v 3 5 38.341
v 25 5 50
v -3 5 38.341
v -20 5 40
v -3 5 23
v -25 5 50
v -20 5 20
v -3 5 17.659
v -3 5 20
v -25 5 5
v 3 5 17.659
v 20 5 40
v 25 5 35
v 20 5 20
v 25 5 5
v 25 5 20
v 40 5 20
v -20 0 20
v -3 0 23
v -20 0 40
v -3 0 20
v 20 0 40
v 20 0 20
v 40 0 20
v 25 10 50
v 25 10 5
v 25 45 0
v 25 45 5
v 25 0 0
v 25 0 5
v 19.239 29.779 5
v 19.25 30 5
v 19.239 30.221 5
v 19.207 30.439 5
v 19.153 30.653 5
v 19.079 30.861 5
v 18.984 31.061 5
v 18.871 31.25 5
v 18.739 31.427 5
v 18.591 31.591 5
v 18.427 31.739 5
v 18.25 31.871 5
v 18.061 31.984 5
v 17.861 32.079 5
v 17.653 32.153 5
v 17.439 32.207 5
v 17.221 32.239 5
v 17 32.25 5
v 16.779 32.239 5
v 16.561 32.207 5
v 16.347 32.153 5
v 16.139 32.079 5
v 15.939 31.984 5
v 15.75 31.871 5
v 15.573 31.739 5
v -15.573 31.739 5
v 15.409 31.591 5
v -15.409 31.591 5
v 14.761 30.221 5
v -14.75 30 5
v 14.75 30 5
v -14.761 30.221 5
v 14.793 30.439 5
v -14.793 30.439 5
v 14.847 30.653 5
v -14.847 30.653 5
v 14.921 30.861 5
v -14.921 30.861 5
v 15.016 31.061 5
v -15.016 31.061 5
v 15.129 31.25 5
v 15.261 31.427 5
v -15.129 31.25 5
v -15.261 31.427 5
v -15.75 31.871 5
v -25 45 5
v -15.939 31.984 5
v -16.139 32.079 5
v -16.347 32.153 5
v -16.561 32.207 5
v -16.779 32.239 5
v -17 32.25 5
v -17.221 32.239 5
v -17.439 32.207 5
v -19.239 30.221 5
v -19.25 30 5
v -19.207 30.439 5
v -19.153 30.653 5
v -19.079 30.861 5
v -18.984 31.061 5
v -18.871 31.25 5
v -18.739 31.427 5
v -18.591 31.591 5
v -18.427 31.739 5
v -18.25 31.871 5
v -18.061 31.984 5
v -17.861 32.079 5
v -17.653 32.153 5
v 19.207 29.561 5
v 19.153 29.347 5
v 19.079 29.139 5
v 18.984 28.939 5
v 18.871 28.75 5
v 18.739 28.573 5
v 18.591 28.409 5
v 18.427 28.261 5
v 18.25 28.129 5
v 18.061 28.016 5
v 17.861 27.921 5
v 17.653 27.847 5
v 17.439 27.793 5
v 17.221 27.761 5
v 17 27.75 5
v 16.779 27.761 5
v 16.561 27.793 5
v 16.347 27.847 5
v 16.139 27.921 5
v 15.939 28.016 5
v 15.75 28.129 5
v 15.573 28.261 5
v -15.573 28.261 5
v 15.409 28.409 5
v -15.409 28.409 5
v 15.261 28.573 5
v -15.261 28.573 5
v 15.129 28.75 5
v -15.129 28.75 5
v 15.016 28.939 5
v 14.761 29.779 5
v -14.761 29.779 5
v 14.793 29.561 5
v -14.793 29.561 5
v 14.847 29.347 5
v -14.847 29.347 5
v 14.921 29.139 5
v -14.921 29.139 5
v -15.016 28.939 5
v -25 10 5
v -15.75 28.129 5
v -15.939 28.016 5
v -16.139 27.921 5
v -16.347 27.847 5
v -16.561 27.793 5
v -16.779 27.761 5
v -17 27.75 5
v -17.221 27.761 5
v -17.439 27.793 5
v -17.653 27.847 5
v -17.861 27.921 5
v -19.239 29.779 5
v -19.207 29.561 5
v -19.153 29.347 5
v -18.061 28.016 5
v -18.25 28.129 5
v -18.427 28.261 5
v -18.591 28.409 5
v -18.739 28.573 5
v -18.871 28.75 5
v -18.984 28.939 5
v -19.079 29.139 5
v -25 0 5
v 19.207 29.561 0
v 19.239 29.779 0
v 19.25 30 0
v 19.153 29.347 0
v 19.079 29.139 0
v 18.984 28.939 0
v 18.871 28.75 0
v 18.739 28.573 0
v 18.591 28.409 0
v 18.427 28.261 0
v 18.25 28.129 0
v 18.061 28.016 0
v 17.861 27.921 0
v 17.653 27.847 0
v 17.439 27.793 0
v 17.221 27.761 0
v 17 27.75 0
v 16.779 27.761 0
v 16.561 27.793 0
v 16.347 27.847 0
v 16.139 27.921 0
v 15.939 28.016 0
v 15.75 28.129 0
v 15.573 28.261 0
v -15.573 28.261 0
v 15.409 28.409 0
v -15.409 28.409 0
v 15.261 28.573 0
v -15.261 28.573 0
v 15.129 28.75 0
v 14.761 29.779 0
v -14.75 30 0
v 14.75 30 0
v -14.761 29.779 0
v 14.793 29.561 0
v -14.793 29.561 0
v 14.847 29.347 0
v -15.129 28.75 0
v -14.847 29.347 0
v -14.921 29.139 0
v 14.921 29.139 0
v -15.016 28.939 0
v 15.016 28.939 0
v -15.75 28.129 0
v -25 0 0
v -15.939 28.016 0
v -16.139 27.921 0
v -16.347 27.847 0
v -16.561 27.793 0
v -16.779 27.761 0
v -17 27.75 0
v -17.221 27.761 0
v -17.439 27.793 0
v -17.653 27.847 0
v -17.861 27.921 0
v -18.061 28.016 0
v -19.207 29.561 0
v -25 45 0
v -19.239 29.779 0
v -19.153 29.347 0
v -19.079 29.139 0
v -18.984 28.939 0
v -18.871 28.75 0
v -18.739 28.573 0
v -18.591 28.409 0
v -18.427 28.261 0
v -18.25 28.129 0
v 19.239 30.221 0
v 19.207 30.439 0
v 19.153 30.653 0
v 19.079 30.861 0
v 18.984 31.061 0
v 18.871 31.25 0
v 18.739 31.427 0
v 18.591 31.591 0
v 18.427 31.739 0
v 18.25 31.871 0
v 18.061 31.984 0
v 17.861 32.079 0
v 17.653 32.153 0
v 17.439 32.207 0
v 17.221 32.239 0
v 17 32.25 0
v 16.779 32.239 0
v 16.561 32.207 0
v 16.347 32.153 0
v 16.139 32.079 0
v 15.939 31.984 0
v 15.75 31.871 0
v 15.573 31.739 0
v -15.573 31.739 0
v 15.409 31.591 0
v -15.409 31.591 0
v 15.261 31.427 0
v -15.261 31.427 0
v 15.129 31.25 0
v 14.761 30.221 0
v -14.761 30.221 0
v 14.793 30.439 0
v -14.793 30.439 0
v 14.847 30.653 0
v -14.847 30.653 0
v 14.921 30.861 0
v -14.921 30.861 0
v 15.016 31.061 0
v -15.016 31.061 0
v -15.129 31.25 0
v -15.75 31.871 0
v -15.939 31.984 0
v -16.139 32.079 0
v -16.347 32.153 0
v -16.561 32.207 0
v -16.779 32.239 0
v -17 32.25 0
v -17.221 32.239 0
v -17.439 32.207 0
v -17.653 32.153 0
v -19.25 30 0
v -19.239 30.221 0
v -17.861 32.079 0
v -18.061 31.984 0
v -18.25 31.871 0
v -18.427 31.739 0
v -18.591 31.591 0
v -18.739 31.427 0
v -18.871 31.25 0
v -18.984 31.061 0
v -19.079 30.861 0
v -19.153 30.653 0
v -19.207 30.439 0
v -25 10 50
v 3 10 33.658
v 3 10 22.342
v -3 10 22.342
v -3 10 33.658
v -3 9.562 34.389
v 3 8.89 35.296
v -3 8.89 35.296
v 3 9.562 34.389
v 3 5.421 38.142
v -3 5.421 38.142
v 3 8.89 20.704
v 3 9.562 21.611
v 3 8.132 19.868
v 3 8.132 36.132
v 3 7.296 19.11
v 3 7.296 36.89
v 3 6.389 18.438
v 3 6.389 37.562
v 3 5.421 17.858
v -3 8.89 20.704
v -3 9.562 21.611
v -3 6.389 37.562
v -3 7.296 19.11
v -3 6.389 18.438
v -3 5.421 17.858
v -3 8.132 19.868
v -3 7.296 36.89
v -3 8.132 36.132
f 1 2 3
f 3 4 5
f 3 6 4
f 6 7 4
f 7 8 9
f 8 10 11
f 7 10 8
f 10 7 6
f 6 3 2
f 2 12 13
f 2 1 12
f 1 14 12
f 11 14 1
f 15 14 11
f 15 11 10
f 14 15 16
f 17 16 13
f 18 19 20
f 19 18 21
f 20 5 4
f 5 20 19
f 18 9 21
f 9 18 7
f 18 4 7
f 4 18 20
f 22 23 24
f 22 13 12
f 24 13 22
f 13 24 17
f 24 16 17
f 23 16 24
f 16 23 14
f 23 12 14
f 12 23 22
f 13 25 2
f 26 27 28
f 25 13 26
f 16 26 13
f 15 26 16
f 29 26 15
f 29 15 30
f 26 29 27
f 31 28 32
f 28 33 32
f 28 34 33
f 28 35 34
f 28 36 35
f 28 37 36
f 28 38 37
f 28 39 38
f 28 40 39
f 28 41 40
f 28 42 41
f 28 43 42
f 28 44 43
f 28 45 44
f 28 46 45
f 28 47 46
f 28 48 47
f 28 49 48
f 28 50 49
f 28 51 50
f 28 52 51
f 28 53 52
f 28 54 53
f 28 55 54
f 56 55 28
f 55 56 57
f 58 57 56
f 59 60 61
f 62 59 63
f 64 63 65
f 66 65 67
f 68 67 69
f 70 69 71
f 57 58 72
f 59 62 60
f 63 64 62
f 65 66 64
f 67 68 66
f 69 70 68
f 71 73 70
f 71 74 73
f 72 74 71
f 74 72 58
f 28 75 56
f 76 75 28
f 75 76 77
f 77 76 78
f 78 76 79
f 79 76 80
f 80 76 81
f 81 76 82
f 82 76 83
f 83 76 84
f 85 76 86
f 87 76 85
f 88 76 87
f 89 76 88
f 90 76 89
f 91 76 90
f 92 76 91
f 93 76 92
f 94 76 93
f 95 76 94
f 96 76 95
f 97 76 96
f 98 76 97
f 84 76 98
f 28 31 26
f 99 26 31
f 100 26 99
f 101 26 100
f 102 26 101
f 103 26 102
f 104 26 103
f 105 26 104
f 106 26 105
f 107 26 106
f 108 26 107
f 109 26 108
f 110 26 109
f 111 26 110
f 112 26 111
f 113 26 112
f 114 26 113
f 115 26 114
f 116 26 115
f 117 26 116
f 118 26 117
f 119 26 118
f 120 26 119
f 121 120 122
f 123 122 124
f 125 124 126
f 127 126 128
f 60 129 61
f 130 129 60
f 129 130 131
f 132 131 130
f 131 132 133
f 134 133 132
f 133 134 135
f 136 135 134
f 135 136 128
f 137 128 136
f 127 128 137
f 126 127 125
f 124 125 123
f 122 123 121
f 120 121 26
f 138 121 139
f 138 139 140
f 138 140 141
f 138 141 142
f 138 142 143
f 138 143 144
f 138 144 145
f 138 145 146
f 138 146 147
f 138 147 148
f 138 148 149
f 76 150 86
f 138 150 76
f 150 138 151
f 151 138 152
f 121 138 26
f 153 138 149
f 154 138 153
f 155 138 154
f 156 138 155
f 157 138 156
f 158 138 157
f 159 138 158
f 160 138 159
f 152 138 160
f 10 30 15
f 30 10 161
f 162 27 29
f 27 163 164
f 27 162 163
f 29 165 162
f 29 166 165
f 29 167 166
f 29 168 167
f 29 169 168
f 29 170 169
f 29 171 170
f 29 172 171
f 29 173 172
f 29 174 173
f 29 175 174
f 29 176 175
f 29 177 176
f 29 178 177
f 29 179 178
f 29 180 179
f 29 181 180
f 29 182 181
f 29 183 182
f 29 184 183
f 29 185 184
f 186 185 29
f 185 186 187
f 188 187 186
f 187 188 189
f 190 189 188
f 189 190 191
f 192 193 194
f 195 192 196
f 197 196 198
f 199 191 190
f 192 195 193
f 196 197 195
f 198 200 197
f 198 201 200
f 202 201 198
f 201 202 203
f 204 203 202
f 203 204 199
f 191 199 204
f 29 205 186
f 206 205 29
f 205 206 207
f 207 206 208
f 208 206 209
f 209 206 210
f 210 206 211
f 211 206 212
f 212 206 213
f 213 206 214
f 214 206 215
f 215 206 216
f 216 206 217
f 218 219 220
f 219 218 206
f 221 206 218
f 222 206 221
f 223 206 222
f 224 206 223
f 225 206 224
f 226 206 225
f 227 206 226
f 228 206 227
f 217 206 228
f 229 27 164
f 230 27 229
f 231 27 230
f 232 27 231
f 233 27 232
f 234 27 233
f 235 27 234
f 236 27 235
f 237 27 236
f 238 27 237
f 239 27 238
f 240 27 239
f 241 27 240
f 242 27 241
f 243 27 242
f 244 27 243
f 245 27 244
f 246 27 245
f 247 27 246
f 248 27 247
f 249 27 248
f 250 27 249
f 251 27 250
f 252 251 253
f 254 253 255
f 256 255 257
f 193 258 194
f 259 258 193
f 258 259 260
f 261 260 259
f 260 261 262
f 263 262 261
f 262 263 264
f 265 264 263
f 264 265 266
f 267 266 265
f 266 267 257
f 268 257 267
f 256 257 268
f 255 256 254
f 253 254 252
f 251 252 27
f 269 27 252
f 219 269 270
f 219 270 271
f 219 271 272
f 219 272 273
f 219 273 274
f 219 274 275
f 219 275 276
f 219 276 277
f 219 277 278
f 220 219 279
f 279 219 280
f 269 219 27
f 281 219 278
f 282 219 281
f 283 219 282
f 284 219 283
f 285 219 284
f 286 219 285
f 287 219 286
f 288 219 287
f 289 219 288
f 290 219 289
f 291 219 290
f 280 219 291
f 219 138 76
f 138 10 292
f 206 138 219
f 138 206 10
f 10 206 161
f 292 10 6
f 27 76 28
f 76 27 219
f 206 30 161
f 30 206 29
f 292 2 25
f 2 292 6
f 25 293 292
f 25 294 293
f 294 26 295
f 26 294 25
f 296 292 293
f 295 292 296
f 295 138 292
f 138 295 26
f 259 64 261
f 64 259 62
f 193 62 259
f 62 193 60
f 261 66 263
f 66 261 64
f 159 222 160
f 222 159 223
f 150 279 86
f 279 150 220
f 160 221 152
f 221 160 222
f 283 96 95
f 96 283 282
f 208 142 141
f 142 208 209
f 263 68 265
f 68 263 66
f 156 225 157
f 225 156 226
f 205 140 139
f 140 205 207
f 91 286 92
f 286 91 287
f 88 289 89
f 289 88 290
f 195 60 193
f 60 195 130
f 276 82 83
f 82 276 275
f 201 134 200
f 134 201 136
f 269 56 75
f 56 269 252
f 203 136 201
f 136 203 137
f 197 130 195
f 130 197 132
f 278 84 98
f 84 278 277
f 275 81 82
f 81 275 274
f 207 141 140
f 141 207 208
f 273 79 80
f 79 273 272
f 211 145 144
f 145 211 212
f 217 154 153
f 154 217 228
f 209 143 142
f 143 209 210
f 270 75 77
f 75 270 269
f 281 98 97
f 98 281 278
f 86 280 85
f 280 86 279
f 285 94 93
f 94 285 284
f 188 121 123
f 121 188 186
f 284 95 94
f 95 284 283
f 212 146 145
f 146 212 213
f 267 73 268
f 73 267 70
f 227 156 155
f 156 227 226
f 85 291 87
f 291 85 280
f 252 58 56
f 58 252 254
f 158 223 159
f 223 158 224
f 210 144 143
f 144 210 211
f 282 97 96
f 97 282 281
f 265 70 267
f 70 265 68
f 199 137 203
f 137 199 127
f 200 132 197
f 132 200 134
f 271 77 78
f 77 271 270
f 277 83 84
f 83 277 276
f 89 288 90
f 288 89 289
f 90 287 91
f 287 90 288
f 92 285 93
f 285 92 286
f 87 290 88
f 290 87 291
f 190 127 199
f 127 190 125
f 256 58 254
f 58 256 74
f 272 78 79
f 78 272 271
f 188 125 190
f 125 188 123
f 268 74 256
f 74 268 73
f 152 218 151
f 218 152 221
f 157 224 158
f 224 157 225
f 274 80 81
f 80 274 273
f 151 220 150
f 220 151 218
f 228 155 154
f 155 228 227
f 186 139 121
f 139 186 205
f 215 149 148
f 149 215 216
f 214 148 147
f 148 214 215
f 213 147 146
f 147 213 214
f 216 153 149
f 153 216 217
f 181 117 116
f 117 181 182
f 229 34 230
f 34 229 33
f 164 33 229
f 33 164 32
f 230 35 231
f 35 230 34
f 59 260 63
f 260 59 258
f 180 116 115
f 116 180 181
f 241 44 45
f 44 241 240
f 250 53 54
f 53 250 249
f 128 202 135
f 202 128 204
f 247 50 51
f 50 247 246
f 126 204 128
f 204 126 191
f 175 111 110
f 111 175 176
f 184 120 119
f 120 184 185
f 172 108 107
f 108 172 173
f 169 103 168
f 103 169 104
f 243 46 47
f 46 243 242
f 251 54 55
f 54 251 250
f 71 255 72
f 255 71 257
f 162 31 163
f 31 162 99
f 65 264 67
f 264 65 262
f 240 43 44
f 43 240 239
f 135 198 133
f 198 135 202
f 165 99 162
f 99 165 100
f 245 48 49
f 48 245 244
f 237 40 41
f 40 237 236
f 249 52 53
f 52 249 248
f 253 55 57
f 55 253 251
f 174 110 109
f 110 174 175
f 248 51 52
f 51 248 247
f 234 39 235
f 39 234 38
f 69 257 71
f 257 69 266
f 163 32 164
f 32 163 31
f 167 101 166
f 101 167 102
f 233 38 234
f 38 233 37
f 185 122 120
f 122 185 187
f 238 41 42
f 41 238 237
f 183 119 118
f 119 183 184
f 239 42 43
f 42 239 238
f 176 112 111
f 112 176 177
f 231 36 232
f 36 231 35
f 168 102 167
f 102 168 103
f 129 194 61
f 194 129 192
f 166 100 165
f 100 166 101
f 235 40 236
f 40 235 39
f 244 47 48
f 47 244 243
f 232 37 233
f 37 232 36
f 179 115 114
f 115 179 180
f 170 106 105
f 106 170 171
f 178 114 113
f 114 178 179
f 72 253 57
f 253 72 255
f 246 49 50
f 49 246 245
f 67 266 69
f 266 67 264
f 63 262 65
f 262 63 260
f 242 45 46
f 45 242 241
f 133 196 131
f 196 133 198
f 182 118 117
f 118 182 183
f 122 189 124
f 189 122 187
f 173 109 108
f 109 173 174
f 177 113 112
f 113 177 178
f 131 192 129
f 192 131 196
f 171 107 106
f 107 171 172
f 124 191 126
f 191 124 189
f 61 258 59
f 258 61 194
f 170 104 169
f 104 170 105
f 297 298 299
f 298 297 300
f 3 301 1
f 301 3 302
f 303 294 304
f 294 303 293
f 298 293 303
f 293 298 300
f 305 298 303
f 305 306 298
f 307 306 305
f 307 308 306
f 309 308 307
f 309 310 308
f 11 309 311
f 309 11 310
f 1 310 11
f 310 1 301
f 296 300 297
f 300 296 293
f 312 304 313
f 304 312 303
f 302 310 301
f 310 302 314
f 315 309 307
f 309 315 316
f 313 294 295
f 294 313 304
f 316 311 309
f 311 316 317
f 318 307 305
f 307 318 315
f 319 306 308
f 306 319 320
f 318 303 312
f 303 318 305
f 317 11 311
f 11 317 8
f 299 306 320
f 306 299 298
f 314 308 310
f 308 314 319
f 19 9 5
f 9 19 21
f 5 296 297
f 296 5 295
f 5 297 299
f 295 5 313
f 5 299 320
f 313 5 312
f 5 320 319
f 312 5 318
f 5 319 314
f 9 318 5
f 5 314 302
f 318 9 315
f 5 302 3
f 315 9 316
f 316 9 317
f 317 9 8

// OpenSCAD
// L-shaped mounting bracket for NEMA 17 stepper motor
// Print orientation: base plate flat on the bed, vertical plate upright.

$fn = 64;

// ---- Base plate ----
plate_x = 25;    // plate extends from -25 to +25 in X
plate_y = 45;    // plate extends from 0 to 45 in Y
plate_t = 5;     // plate thickness in Z (0..5)

// ---- Motor plate ----
motor_x = 25;    // motor plate extends from -25 to +25 in X
motor_y = 5;     // motor plate extends from 0 to 5 in Y
motor_h = 50;    // motor plate height in Z (0..50)

// ---- Boss hole ----
boss_d  = 23;    // diameter of motor centring boss hole
boss_x  = 0;     // hole centre X
boss_z  = 28;    // hole centre Z

// ---- Screw holes ----
screw_d  = 3.4;  // M3 screw hole diameter
pitch   = 31;    // square pattern pitch (centre to centre)
screws  = 4;     // number of screw holes

// ---- Gussets ----
gusset_t = 5;    // gusset thickness along X
gusset_l = 20;   // right-triangle leg length (along +Y and +Z)

// ---- Misc ----
eps = 0.5;       // overshoot for clean boolean cuts

difference() {
    union() {
        // Base plate
        translate([-plate_x, 0, 0])
            cube([plate_x * 2, plate_y, plate_t]);

        // Vertical motor plate, standing on the back edge of the base
        translate([-motor_x, motor_y, 0])
            cube([motor_x * 2, motor_y, motor_h]);

        // Triangular gussets, flush with the left and right edges
        for (sx = [-1, 1])
            translate([sx * (motor_x - gusset_t), motor_y, gusset_l])
                rotate([90, 0, 0])
                    linear_extrude(height = gusset_t)
                        polygon(points = [
                            [0, 0],
                            [gusset_l, 0],
                            [0, gusset_l]
                        ]);
    }

    // Two vertical through-holes in the base plate
    for (px = [-17, 17])
        for (py = 30)
            translate([px, py, -eps])
                cylinder(d = 4.5, h = plate_t + 2 * eps);

    // Boss hole and screw holes, all through the motor plate along Y
    translate([boss_x, 0, boss_z])
        rotate([0, 90, 0]) {
            cylinder(d = boss_d, h = motor_y + 2 * eps, center = true);

            for (i = [-1, 1])
                for (j = [-1, 1])
                    translate([i * pitch / 2, 0, j * pitch / 2])
                        cylinder(d = screw_d, h = motor_y + 2 * eps, center = true);
        }
}
